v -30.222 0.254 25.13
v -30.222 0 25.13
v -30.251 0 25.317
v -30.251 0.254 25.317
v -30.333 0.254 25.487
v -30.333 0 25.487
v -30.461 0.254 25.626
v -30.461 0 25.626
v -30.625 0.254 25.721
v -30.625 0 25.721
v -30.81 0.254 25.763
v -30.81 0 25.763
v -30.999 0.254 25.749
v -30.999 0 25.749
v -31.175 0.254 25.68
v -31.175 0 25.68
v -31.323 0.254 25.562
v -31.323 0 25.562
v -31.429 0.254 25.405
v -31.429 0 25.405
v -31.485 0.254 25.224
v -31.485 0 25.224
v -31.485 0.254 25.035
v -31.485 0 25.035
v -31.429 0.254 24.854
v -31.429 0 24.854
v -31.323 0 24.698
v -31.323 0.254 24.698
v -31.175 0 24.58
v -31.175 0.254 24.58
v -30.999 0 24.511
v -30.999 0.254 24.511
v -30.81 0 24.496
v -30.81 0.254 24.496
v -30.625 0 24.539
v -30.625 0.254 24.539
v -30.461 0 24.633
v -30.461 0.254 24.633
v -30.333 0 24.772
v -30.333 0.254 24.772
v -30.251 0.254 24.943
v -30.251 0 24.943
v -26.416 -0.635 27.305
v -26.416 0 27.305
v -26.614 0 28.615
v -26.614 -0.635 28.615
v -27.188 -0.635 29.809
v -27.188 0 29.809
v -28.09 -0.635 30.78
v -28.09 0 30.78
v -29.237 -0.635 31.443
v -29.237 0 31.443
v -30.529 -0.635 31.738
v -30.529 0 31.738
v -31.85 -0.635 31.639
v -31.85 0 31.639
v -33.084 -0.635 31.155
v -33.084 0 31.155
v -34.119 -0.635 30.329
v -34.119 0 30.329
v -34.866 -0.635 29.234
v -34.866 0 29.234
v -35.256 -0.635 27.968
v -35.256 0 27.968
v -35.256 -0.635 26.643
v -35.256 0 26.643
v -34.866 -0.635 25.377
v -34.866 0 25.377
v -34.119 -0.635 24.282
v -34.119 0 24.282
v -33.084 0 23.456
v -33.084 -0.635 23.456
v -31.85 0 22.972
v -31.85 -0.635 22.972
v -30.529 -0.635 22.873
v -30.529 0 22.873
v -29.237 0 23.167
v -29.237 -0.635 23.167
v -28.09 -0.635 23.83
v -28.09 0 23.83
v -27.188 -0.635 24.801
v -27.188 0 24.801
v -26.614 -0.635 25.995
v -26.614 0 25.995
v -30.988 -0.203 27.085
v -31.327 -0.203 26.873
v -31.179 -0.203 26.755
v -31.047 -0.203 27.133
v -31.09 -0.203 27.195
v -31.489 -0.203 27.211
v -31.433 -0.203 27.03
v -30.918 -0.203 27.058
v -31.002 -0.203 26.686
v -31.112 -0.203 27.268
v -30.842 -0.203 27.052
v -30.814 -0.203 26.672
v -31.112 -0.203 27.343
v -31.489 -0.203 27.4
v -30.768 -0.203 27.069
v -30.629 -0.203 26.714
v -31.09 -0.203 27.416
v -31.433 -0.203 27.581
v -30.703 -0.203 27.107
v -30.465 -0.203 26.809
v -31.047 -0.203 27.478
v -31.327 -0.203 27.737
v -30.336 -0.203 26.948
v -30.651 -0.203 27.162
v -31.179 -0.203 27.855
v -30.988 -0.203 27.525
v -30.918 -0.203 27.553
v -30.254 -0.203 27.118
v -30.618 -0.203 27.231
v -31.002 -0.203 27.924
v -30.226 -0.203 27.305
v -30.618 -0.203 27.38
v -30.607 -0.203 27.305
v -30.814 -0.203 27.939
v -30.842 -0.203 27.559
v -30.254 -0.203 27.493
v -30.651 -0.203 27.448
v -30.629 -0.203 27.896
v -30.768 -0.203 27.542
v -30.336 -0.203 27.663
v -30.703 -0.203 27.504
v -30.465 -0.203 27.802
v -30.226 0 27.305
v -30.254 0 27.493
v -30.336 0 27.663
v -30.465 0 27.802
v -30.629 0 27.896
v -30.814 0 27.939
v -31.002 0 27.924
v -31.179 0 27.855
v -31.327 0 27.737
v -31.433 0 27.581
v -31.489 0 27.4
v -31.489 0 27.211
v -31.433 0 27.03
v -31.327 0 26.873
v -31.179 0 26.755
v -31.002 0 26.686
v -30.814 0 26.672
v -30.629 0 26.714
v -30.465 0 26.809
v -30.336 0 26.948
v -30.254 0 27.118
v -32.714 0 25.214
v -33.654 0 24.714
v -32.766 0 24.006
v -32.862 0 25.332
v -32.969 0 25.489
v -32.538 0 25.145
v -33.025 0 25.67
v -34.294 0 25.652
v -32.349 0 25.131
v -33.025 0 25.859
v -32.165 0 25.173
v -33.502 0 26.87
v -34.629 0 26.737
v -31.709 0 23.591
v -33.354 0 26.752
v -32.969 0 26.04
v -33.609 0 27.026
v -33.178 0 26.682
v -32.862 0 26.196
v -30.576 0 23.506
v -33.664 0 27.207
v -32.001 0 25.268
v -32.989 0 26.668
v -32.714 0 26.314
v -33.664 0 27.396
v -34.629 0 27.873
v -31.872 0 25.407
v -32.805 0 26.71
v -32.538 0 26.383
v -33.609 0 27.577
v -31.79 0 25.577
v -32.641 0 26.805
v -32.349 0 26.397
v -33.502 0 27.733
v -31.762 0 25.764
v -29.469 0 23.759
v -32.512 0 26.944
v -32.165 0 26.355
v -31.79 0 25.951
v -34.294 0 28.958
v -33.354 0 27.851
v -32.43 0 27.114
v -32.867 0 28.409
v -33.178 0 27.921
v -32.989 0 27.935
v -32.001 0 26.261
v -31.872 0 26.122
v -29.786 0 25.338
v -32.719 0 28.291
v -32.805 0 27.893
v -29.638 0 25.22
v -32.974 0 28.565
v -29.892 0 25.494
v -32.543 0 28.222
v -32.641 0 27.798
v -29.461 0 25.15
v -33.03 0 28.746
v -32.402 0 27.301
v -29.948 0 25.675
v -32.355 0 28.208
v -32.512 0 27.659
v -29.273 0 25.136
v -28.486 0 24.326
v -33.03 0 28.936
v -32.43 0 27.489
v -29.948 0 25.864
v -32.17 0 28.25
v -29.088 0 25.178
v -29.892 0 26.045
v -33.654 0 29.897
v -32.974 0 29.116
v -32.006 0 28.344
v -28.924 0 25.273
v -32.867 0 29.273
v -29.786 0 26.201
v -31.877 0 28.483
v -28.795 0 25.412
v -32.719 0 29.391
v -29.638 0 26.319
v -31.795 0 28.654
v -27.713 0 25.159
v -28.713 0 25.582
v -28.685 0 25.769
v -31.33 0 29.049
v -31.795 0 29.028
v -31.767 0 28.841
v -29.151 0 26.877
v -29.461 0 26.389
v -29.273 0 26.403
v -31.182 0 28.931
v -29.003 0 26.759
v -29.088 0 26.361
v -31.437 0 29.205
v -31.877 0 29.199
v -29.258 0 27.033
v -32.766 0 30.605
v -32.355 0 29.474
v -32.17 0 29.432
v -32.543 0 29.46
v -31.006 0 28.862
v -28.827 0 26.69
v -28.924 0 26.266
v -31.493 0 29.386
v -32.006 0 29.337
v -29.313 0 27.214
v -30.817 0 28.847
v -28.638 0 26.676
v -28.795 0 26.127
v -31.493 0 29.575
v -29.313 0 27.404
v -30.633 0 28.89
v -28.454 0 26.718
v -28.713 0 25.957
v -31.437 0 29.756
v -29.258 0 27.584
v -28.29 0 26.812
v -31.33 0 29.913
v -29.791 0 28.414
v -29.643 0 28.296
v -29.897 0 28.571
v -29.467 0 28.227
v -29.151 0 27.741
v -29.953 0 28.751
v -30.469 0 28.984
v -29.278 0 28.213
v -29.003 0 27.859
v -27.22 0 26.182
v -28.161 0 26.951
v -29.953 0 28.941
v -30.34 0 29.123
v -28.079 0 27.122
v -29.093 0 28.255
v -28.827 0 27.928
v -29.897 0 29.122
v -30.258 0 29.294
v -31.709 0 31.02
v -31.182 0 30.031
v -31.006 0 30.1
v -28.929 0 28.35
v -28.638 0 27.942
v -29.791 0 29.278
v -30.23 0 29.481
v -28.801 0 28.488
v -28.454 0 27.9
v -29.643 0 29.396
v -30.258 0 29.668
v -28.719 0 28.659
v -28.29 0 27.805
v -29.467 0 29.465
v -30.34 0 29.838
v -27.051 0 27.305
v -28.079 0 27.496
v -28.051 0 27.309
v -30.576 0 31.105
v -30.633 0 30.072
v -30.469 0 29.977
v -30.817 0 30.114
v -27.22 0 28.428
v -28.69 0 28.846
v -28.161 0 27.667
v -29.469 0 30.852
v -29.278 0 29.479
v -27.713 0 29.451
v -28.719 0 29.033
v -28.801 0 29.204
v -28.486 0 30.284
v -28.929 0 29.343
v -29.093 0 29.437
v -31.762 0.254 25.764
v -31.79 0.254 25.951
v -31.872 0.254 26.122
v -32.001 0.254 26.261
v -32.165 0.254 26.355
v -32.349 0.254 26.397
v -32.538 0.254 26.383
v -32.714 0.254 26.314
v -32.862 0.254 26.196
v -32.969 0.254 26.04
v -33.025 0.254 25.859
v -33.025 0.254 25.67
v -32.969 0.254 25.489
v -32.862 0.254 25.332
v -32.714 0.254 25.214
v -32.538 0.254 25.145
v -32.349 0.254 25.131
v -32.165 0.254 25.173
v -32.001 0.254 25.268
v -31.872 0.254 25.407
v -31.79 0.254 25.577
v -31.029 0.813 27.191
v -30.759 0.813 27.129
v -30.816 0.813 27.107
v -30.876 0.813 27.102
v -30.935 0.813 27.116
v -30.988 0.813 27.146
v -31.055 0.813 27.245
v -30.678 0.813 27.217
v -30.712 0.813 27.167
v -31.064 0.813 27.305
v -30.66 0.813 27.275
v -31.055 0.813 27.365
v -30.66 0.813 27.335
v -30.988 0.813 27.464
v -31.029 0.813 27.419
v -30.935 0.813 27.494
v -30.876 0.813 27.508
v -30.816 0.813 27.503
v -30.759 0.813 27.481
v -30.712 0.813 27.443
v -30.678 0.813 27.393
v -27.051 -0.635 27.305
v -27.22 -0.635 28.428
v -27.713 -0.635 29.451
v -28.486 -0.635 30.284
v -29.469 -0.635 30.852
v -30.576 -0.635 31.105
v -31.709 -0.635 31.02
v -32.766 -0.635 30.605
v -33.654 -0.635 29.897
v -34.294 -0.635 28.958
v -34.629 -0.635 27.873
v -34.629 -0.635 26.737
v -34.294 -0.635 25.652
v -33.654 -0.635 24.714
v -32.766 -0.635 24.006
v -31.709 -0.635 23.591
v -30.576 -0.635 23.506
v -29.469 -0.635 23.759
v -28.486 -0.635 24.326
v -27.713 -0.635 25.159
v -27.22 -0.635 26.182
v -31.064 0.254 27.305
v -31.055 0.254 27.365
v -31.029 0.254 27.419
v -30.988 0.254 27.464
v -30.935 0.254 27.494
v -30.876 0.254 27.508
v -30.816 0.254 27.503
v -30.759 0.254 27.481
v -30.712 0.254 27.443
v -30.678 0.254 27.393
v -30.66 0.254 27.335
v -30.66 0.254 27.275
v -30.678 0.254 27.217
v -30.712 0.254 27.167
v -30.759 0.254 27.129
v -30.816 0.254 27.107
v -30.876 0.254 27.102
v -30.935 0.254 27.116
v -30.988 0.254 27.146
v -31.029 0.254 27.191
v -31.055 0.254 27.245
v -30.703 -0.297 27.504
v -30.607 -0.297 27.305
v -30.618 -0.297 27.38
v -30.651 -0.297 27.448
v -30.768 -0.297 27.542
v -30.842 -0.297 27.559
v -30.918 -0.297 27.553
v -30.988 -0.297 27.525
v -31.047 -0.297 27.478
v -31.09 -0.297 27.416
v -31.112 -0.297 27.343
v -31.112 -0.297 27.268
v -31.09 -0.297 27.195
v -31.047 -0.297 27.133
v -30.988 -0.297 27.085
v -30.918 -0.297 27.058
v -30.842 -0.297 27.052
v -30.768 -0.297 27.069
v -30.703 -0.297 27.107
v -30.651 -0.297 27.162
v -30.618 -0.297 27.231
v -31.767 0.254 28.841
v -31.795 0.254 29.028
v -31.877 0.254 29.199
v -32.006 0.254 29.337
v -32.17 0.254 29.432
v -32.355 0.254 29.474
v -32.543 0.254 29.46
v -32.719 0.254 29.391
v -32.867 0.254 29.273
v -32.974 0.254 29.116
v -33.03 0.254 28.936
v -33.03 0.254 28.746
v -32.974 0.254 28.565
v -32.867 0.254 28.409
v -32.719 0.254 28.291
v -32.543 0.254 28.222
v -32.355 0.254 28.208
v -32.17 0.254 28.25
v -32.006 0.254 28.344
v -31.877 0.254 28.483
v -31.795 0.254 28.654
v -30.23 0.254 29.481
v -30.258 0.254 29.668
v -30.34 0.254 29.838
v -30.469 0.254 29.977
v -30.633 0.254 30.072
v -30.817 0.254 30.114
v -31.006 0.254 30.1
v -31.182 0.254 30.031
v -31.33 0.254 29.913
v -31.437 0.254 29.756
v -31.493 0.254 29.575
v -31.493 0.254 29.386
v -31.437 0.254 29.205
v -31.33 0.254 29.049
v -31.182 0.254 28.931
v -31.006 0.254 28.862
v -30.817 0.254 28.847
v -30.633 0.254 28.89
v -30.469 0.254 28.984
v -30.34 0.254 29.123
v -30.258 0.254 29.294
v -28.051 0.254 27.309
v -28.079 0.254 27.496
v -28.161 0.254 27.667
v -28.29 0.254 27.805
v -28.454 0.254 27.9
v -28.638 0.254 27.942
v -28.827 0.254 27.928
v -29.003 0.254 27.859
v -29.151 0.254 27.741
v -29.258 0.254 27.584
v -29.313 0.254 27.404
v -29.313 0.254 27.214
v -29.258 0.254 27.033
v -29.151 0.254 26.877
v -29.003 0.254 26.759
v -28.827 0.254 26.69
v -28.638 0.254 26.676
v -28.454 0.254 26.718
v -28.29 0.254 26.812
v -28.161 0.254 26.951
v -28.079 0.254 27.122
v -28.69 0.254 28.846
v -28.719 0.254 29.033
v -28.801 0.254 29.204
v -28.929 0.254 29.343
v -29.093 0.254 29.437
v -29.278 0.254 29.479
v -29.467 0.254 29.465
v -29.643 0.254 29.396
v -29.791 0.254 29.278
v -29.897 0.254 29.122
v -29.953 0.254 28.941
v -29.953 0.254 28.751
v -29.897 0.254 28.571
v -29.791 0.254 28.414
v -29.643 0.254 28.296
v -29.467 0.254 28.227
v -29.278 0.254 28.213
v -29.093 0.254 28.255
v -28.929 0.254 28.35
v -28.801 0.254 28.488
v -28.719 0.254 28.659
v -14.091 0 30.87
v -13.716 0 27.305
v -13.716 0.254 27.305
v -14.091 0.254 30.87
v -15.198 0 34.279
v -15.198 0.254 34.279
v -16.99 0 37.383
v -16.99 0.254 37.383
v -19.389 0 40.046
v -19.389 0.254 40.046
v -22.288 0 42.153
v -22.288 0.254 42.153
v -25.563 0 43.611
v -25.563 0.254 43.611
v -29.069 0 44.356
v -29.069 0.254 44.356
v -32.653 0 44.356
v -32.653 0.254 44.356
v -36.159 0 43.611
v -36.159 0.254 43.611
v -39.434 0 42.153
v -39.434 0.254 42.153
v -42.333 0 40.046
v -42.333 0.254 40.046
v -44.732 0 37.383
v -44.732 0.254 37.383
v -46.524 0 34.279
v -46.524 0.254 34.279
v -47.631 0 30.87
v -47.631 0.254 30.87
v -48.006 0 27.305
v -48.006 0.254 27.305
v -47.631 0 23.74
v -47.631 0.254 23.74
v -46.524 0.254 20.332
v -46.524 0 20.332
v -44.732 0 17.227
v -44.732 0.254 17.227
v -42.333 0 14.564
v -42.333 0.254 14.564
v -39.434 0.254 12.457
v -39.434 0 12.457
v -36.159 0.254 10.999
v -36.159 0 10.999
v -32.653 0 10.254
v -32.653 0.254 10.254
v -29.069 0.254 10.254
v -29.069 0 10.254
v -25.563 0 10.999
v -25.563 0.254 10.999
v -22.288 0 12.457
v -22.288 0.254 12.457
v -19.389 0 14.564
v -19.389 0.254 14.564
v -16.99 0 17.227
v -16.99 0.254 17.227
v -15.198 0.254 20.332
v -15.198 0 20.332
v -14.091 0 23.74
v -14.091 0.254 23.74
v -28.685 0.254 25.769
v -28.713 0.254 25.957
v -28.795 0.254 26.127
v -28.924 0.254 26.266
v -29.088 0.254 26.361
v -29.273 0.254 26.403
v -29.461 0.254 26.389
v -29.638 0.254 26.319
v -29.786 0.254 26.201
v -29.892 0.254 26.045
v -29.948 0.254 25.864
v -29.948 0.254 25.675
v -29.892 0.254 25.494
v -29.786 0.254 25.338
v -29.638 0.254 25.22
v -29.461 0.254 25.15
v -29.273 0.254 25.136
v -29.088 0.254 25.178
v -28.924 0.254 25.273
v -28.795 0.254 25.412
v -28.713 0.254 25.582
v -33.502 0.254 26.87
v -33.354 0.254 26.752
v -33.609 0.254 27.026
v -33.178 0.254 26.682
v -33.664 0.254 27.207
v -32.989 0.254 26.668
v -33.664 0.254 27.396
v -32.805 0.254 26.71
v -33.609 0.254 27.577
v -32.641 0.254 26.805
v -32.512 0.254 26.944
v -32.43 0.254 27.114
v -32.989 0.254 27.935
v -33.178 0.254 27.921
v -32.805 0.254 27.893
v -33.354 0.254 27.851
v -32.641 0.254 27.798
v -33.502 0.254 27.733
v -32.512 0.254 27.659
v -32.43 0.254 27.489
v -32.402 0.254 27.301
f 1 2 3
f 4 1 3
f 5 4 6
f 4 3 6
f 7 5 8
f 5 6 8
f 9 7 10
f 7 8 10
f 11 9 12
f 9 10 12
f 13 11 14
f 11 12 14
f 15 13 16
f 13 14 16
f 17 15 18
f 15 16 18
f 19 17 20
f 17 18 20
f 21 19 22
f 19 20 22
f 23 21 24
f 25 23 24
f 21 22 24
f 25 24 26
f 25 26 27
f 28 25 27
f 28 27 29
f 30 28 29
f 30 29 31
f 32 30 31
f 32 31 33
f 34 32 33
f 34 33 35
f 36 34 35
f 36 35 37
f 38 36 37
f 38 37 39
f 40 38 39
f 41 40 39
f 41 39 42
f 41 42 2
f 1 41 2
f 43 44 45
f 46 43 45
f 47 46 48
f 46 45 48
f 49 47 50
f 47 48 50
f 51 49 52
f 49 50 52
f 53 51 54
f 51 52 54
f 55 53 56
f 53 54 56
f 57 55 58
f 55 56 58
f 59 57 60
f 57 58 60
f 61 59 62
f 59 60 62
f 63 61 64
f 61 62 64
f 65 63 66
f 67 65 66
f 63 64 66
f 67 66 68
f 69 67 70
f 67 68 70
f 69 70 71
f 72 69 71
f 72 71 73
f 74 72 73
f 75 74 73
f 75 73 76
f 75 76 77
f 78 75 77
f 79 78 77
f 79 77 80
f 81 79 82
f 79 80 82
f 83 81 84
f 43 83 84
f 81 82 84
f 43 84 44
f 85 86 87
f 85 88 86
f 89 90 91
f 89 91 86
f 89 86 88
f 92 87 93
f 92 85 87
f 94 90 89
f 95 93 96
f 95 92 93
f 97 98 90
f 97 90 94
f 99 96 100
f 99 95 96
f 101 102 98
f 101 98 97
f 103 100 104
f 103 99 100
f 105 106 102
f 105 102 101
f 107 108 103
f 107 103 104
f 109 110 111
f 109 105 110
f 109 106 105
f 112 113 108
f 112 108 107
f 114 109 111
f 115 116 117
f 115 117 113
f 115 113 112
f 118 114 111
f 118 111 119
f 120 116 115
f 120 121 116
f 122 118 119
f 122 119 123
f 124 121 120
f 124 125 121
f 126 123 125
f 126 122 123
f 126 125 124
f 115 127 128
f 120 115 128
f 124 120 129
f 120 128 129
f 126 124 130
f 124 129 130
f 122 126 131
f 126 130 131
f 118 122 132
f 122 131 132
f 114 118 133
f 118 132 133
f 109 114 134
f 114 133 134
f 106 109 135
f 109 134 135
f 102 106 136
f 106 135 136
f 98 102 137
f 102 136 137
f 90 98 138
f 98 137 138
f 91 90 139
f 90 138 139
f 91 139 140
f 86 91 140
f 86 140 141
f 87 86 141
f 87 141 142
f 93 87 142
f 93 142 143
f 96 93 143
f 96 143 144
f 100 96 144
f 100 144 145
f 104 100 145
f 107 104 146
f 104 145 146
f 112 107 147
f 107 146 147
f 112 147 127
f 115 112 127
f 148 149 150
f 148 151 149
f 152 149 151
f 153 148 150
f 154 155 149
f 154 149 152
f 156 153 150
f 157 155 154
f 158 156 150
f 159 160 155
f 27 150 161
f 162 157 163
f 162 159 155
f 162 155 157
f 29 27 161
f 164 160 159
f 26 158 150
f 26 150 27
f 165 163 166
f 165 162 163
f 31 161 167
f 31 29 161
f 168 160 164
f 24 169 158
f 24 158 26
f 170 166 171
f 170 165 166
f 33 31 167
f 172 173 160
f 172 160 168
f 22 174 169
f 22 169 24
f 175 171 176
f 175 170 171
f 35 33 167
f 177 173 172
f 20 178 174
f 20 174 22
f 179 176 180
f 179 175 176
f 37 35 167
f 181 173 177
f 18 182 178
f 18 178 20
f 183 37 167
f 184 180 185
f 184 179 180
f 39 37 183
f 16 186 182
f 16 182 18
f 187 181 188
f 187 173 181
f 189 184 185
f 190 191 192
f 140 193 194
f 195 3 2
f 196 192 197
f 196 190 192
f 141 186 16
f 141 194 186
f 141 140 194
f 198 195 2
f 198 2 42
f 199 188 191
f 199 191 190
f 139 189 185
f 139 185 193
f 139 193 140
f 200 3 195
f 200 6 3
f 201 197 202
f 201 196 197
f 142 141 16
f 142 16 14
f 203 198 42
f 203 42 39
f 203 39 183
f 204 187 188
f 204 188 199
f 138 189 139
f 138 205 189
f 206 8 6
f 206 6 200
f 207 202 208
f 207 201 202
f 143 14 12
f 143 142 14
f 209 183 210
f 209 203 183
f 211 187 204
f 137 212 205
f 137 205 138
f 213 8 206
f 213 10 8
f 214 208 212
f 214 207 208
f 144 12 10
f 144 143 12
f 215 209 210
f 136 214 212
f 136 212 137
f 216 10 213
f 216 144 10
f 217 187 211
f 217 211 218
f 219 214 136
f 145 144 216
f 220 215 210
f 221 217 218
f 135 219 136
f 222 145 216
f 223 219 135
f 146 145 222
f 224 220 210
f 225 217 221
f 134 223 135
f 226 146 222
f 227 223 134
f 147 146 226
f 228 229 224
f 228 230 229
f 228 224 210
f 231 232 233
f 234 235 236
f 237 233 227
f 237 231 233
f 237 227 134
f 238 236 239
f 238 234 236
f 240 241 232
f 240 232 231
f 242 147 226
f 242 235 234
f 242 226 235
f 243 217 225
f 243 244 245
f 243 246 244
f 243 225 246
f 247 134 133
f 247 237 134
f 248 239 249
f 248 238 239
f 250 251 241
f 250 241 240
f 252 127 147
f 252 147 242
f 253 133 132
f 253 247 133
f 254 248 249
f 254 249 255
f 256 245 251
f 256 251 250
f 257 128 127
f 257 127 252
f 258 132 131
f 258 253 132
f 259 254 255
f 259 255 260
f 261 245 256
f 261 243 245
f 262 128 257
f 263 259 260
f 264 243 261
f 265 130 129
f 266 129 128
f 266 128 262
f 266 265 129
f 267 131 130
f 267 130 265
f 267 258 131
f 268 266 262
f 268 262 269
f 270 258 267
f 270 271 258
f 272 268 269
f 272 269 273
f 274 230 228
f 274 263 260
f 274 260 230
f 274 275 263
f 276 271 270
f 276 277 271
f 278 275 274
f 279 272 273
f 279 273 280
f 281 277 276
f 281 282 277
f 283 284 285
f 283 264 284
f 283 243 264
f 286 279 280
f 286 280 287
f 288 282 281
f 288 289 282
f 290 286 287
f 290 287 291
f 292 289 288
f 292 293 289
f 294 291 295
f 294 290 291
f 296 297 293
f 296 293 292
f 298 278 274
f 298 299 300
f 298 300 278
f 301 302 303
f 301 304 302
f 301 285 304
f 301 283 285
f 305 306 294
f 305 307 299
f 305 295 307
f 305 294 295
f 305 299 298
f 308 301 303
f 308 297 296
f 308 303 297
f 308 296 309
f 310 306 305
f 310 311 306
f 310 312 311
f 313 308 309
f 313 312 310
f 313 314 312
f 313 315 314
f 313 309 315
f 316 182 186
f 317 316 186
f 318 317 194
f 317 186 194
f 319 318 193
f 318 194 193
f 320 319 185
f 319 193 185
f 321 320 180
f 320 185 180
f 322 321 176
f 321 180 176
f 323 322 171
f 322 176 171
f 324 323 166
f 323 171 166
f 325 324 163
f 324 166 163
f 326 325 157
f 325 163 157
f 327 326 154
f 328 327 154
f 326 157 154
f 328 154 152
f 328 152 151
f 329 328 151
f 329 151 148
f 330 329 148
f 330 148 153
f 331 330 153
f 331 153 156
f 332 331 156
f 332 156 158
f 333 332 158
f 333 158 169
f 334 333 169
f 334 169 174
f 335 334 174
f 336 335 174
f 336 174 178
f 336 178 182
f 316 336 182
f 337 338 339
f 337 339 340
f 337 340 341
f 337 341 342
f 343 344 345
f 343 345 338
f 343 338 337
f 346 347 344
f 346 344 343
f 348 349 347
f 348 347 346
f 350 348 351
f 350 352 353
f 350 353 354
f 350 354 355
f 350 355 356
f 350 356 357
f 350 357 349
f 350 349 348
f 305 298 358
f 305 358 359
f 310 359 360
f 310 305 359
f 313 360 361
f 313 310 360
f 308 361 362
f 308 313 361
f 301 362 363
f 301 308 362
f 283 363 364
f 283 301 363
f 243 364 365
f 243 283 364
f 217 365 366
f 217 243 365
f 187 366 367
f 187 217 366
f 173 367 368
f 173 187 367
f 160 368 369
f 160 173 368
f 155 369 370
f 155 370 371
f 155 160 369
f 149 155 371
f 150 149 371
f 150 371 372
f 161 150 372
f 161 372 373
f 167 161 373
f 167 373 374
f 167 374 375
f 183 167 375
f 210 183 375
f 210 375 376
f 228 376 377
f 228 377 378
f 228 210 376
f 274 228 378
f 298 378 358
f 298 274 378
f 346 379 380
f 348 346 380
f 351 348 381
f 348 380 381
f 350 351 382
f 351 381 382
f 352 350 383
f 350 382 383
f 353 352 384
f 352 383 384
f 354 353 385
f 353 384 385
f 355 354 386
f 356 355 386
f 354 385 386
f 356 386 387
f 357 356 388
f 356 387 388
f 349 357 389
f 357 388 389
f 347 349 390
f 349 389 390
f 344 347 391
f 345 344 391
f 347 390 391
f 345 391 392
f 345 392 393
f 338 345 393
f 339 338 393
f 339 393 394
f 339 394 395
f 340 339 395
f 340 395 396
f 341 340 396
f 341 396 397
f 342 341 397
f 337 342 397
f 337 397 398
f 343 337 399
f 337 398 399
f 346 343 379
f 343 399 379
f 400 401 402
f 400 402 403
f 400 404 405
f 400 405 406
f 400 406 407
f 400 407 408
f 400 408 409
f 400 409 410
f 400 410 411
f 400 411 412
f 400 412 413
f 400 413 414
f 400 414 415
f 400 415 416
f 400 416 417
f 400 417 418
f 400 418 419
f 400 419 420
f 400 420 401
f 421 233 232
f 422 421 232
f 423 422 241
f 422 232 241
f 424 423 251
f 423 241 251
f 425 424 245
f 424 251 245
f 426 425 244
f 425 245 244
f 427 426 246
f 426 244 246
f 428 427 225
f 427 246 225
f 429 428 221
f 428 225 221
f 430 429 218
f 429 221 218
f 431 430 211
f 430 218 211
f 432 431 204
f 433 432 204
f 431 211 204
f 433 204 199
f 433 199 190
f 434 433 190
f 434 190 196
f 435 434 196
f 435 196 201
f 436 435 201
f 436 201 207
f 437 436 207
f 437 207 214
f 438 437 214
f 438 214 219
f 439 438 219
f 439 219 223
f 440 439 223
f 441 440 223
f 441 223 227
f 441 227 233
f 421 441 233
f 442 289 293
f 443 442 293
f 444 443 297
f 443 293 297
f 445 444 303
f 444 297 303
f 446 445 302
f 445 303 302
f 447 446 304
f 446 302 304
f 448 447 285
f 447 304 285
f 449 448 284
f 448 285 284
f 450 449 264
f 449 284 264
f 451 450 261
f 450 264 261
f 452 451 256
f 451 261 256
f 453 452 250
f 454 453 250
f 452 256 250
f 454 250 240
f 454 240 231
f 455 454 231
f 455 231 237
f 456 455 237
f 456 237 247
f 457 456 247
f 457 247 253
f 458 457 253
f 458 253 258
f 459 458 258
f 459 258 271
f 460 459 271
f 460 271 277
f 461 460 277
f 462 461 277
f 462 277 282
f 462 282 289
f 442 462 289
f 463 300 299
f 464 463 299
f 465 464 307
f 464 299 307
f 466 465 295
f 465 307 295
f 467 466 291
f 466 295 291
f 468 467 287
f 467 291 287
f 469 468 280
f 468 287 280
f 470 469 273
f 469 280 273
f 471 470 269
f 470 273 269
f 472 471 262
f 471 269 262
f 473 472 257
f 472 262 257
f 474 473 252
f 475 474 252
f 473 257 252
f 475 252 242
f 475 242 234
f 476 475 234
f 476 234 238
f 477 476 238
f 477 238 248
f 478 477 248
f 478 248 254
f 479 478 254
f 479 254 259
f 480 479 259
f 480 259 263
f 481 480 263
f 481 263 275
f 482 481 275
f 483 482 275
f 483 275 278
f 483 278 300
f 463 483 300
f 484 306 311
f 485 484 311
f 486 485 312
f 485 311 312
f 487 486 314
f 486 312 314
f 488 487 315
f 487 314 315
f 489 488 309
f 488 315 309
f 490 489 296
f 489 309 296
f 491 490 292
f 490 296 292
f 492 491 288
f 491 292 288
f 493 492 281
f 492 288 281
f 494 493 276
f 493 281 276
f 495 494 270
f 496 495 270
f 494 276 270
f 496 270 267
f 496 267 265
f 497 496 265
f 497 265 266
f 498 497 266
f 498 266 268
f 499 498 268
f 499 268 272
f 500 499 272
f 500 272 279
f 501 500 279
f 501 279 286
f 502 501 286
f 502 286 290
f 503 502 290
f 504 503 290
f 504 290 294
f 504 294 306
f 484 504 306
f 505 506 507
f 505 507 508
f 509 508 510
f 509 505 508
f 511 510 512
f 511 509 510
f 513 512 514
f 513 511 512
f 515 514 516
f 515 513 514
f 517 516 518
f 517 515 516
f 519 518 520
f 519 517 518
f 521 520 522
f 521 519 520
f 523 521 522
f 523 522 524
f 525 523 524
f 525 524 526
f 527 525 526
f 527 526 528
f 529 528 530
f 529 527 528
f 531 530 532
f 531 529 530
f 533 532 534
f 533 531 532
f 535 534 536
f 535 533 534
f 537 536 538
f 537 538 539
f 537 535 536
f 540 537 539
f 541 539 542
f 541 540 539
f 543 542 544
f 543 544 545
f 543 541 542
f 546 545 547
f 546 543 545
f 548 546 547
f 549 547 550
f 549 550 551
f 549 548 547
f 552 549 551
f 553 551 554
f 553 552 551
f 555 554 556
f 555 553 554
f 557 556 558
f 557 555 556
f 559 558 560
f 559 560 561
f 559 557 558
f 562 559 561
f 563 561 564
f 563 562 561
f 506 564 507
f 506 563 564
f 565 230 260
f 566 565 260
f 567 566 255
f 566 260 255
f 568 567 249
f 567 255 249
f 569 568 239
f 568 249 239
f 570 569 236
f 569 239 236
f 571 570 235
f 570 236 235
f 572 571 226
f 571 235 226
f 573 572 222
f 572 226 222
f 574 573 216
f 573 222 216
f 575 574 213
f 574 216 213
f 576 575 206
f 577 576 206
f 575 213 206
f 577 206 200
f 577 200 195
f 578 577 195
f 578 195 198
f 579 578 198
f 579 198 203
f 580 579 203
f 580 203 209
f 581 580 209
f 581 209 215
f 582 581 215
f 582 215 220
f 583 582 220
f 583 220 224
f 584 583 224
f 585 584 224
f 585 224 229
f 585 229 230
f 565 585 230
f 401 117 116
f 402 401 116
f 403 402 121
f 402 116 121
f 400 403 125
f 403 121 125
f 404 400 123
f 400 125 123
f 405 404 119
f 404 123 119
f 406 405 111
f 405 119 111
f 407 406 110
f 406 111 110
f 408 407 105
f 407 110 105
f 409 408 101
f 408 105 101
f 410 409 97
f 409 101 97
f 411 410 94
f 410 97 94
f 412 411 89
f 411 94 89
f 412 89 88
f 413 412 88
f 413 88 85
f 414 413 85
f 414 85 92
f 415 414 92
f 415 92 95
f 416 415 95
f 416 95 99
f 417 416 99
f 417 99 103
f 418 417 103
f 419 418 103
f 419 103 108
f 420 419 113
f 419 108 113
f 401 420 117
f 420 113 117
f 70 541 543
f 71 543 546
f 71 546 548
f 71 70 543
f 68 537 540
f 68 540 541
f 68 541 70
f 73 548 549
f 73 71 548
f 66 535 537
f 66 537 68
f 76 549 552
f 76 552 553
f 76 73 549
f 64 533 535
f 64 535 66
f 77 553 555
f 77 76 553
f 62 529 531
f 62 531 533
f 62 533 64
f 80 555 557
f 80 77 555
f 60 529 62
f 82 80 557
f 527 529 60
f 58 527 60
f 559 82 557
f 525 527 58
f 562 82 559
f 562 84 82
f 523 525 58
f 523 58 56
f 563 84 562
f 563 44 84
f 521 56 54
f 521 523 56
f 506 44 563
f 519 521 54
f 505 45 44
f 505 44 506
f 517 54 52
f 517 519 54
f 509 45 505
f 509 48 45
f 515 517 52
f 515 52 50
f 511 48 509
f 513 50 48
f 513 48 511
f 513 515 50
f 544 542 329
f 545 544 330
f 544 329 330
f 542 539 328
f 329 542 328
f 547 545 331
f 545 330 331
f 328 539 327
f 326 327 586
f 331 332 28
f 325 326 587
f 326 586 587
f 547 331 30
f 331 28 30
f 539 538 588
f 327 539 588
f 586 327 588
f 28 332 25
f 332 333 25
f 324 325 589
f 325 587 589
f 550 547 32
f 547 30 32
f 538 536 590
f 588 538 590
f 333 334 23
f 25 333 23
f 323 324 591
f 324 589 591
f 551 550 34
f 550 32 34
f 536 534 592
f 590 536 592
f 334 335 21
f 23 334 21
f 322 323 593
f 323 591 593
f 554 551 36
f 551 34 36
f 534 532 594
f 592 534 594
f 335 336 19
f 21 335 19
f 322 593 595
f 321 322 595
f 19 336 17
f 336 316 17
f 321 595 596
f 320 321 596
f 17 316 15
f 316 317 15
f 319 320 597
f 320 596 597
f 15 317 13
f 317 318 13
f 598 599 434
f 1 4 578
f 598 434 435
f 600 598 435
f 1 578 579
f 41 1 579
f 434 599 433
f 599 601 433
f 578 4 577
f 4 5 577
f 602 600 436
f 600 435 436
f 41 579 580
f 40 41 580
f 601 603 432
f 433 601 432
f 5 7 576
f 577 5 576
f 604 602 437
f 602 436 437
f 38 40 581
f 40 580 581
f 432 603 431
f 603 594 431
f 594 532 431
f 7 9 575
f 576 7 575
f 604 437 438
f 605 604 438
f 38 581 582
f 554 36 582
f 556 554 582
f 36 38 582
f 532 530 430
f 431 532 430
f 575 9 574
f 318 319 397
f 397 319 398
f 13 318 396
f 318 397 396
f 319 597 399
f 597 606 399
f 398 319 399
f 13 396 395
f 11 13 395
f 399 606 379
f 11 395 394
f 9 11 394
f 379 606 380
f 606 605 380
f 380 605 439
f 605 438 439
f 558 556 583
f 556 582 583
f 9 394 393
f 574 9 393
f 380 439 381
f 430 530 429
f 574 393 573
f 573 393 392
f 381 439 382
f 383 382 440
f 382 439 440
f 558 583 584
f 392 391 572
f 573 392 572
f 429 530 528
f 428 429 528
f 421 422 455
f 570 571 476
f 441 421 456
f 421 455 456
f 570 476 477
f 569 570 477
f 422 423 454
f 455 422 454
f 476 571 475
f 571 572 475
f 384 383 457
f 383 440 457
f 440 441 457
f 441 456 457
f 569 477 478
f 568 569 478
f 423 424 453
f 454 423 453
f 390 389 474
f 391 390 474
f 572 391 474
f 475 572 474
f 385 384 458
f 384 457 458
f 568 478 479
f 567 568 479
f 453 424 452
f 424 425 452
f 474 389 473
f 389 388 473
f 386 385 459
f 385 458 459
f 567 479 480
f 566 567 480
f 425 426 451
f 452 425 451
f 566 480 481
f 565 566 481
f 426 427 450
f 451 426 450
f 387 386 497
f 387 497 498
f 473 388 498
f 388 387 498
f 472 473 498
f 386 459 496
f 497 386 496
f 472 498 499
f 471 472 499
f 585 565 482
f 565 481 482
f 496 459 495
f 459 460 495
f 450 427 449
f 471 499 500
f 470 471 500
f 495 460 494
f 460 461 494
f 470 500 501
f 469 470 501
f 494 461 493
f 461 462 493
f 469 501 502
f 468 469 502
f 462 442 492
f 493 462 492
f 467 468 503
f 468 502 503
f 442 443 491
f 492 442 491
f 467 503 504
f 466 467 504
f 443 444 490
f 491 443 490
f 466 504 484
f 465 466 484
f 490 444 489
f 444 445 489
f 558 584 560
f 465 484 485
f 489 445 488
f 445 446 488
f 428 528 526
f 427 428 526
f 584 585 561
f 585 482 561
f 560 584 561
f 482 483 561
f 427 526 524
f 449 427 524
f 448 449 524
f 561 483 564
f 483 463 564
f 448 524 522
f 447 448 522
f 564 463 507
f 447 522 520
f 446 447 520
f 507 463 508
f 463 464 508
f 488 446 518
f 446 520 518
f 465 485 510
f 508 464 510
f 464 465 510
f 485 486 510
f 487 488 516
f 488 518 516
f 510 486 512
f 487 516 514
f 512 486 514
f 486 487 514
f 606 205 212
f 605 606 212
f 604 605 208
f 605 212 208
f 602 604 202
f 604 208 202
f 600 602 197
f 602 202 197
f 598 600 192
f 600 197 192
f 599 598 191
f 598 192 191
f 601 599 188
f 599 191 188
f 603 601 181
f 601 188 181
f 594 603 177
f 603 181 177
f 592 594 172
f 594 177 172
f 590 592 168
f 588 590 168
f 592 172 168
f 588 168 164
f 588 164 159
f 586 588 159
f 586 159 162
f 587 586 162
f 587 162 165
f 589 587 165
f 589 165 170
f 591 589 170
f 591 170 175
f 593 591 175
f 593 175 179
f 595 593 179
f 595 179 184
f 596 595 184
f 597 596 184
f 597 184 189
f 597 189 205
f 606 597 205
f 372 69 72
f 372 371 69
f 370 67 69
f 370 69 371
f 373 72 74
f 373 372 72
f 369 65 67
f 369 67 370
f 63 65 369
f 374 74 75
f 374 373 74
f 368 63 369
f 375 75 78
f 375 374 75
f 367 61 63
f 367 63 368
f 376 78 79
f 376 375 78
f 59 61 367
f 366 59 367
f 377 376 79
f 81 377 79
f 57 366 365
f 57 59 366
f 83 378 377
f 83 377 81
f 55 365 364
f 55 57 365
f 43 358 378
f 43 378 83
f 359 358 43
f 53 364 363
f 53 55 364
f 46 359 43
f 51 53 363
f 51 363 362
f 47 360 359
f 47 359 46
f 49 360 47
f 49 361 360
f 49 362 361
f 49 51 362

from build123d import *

# Parameters (mm, degrees)
F0_R      = 17.145
F1_DEPTH  = 0.254
F2_R      = 4.445
F2_R_2    = 3.81
F3_DEPTH  = 0.635
F4_R      = 0.635
F5_DEPTH  = 0.2032
F6_R      = 0.254
F7_DEPTH  = 0.09398
F8_R      = 0.635
F9_DEPTH  = 1.8796
F10_R     = 0.2032
F11_DEPTH = 0.5588


with BuildPart() as f1:
    # F0 (on Front) → F1 (new body)
    with BuildSketch(Plane.XZ):
        with Locations((-30.861, 27.305001)):
            Circle(F0_R)
    extrude(amount=-F1_DEPTH)

    # F2 (on Front) → F3 (join)
    with BuildSketch(Plane.XZ):
        with Locations((-30.861057, 27.305188)):
            Circle(F2_R)
        with Locations((-30.861057, 27.305188)):
            Circle(F2_R_2, mode=Mode.SUBTRACT)
    extrude(amount=F3_DEPTH)

    # F4 (on face) → F5 (join)
    with BuildSketch(Plane.XZ):
        with Locations((-30.861109, 27.30538)):
            Circle(F4_R)
    extrude(amount=F5_DEPTH)

    # F6 (on face) → F7 (join)
    with BuildSketch(Plane.XZ.offset(0.2032)):
        with Locations((-30.861109, 27.30538)):
            Circle(F6_R)
    extrude(amount=F7_DEPTH)

    # F8 (on face) → F9 (cut)
    with BuildSketch(Plane.XZ.offset(0.635)):
        with Locations((-30.864747, 29.480701)):
            Circle(F8_R)
        with Locations((-29.325346, 28.846117)):
            Circle(F8_R)
        with Locations((-28.685544, 27.308878)):
            Circle(F8_R)
        with Locations((-29.320128, 25.769476)):
            Circle(F8_R)
        with Locations((-30.857367, 25.129674)):
            Circle(F8_R)
        with Locations((-33.036571, 27.301498)):
            Circle(F8_R)
        with Locations((-32.401987, 28.840899)):
            Circle(F8_R)
        with Locations((-32.396769, 25.764258)):
            Circle(F8_R)
    extrude(amount=-F9_DEPTH, mode=Mode.SUBTRACT)

    # F10 (on face) → F11 (join)
    with BuildSketch(Plane(origin=(0, 0.254, 0), x_dir=(-1, 0, 0), z_dir=(0, 1, 0))):
        with Locations((30.861, 27.305001)):
            Circle(F10_R)
    extrude(amount=F11_DEPTH)


solid = f1.part
